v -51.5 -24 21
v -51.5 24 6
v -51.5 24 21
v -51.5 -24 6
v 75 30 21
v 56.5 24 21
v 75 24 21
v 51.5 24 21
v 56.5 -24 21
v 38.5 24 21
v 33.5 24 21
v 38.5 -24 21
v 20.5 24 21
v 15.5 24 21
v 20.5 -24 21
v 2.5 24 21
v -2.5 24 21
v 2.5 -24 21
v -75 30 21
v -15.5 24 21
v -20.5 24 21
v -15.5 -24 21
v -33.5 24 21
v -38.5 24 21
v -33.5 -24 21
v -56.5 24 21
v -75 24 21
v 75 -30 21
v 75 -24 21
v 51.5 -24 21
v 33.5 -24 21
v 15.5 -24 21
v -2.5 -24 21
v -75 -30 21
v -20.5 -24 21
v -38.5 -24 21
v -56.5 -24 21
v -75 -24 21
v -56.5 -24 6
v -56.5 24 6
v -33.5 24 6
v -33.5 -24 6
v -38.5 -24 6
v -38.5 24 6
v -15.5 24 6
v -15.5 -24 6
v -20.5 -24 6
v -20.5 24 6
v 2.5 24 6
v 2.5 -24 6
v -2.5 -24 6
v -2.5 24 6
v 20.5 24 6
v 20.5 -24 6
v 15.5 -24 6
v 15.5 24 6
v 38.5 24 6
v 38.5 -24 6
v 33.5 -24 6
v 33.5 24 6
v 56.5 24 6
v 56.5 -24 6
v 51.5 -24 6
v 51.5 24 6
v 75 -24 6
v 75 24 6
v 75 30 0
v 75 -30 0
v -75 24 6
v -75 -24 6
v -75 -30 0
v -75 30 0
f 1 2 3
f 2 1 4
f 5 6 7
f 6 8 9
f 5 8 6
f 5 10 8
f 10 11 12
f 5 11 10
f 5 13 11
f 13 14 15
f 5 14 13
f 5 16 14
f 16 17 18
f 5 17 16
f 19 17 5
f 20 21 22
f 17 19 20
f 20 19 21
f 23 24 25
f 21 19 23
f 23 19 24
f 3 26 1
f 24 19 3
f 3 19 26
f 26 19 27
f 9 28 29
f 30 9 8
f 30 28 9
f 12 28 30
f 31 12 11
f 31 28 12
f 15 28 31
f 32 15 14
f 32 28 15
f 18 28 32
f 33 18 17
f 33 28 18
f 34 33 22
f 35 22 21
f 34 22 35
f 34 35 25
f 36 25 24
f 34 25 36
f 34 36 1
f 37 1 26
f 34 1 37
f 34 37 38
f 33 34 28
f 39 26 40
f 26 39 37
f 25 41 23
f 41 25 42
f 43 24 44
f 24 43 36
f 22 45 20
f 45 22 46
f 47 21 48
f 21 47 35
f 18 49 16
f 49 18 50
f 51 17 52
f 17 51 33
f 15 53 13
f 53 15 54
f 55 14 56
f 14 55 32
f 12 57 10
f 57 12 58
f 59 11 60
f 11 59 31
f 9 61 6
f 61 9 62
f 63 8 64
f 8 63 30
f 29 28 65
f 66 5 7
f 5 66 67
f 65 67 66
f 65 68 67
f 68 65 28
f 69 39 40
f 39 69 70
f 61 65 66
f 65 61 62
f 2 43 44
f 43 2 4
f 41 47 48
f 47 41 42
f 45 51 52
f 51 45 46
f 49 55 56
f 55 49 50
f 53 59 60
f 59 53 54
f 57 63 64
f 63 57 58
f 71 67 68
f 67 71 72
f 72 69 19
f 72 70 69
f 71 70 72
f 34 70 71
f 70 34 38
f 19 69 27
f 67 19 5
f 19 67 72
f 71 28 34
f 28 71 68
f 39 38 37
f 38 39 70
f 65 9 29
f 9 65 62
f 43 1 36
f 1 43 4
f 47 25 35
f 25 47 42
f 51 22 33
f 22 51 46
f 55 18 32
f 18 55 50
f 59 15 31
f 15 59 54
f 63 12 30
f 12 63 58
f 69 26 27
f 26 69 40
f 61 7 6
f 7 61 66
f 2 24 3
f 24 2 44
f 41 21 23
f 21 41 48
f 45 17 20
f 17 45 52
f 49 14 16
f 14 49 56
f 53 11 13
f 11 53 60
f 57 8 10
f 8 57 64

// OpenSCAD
$fn = 32;

// ----------------------------------------------------------------------
// Rib frame 150 x 60 x 21
// 7 ribs at 18 mm pitch
// ----------------------------------------------------------------------

// --- parameters (mm) ---
frame = [150, 60, 6];  // base plate size (x, y, z)
rail_w = 6;            // side rail width
ribs = 7;              // number of ribs
rib_t = 5;             // rib thickness
rib_h = 15;            // rib height above the base plate
pitch = 18;            // pitch between rib centres

// --- derived feature positions (mm) ---
span = (ribs - 1) * pitch;          // = 108   distance between the outer ribs
origin_x = -span / 2;               // = -54   X of the first rib
rib_len = frame[1] - 2 * rail_w + 2;  // = 50   rib length, 1 mm into each rail
feature_centers = [
  [origin_x + 0 * pitch, 0],
  [origin_x + 1 * pitch, 0],
  [origin_x + 2 * pitch, 0],
  [origin_x + 3 * pitch, 0],
  [origin_x + 4 * pitch, 0],
  [origin_x + 5 * pitch, 0],
  [origin_x + 6 * pitch, 0]
];   // rib centre line, drives the rib loop

// base plate, two side rails, then the ribs read straight off feature_centers
union() {
  translate([-frame[0] / 2, -frame[1] / 2, 0]) cube(frame);
  translate([-frame[0] / 2, -frame[1] / 2, 0]) cube([frame[0], rail_w, frame[2] + rib_h]);
  translate([-frame[0] / 2, frame[1] / 2 - rail_w, 0]) cube([frame[0], rail_w, frame[2] + rib_h]);
  for (centre = feature_centers)
    translate([centre[0] - rib_t / 2, centre[1] - rib_len / 2, frame[2] - 1])
      cube([rib_t, rib_len, rib_h + 1]);
}
